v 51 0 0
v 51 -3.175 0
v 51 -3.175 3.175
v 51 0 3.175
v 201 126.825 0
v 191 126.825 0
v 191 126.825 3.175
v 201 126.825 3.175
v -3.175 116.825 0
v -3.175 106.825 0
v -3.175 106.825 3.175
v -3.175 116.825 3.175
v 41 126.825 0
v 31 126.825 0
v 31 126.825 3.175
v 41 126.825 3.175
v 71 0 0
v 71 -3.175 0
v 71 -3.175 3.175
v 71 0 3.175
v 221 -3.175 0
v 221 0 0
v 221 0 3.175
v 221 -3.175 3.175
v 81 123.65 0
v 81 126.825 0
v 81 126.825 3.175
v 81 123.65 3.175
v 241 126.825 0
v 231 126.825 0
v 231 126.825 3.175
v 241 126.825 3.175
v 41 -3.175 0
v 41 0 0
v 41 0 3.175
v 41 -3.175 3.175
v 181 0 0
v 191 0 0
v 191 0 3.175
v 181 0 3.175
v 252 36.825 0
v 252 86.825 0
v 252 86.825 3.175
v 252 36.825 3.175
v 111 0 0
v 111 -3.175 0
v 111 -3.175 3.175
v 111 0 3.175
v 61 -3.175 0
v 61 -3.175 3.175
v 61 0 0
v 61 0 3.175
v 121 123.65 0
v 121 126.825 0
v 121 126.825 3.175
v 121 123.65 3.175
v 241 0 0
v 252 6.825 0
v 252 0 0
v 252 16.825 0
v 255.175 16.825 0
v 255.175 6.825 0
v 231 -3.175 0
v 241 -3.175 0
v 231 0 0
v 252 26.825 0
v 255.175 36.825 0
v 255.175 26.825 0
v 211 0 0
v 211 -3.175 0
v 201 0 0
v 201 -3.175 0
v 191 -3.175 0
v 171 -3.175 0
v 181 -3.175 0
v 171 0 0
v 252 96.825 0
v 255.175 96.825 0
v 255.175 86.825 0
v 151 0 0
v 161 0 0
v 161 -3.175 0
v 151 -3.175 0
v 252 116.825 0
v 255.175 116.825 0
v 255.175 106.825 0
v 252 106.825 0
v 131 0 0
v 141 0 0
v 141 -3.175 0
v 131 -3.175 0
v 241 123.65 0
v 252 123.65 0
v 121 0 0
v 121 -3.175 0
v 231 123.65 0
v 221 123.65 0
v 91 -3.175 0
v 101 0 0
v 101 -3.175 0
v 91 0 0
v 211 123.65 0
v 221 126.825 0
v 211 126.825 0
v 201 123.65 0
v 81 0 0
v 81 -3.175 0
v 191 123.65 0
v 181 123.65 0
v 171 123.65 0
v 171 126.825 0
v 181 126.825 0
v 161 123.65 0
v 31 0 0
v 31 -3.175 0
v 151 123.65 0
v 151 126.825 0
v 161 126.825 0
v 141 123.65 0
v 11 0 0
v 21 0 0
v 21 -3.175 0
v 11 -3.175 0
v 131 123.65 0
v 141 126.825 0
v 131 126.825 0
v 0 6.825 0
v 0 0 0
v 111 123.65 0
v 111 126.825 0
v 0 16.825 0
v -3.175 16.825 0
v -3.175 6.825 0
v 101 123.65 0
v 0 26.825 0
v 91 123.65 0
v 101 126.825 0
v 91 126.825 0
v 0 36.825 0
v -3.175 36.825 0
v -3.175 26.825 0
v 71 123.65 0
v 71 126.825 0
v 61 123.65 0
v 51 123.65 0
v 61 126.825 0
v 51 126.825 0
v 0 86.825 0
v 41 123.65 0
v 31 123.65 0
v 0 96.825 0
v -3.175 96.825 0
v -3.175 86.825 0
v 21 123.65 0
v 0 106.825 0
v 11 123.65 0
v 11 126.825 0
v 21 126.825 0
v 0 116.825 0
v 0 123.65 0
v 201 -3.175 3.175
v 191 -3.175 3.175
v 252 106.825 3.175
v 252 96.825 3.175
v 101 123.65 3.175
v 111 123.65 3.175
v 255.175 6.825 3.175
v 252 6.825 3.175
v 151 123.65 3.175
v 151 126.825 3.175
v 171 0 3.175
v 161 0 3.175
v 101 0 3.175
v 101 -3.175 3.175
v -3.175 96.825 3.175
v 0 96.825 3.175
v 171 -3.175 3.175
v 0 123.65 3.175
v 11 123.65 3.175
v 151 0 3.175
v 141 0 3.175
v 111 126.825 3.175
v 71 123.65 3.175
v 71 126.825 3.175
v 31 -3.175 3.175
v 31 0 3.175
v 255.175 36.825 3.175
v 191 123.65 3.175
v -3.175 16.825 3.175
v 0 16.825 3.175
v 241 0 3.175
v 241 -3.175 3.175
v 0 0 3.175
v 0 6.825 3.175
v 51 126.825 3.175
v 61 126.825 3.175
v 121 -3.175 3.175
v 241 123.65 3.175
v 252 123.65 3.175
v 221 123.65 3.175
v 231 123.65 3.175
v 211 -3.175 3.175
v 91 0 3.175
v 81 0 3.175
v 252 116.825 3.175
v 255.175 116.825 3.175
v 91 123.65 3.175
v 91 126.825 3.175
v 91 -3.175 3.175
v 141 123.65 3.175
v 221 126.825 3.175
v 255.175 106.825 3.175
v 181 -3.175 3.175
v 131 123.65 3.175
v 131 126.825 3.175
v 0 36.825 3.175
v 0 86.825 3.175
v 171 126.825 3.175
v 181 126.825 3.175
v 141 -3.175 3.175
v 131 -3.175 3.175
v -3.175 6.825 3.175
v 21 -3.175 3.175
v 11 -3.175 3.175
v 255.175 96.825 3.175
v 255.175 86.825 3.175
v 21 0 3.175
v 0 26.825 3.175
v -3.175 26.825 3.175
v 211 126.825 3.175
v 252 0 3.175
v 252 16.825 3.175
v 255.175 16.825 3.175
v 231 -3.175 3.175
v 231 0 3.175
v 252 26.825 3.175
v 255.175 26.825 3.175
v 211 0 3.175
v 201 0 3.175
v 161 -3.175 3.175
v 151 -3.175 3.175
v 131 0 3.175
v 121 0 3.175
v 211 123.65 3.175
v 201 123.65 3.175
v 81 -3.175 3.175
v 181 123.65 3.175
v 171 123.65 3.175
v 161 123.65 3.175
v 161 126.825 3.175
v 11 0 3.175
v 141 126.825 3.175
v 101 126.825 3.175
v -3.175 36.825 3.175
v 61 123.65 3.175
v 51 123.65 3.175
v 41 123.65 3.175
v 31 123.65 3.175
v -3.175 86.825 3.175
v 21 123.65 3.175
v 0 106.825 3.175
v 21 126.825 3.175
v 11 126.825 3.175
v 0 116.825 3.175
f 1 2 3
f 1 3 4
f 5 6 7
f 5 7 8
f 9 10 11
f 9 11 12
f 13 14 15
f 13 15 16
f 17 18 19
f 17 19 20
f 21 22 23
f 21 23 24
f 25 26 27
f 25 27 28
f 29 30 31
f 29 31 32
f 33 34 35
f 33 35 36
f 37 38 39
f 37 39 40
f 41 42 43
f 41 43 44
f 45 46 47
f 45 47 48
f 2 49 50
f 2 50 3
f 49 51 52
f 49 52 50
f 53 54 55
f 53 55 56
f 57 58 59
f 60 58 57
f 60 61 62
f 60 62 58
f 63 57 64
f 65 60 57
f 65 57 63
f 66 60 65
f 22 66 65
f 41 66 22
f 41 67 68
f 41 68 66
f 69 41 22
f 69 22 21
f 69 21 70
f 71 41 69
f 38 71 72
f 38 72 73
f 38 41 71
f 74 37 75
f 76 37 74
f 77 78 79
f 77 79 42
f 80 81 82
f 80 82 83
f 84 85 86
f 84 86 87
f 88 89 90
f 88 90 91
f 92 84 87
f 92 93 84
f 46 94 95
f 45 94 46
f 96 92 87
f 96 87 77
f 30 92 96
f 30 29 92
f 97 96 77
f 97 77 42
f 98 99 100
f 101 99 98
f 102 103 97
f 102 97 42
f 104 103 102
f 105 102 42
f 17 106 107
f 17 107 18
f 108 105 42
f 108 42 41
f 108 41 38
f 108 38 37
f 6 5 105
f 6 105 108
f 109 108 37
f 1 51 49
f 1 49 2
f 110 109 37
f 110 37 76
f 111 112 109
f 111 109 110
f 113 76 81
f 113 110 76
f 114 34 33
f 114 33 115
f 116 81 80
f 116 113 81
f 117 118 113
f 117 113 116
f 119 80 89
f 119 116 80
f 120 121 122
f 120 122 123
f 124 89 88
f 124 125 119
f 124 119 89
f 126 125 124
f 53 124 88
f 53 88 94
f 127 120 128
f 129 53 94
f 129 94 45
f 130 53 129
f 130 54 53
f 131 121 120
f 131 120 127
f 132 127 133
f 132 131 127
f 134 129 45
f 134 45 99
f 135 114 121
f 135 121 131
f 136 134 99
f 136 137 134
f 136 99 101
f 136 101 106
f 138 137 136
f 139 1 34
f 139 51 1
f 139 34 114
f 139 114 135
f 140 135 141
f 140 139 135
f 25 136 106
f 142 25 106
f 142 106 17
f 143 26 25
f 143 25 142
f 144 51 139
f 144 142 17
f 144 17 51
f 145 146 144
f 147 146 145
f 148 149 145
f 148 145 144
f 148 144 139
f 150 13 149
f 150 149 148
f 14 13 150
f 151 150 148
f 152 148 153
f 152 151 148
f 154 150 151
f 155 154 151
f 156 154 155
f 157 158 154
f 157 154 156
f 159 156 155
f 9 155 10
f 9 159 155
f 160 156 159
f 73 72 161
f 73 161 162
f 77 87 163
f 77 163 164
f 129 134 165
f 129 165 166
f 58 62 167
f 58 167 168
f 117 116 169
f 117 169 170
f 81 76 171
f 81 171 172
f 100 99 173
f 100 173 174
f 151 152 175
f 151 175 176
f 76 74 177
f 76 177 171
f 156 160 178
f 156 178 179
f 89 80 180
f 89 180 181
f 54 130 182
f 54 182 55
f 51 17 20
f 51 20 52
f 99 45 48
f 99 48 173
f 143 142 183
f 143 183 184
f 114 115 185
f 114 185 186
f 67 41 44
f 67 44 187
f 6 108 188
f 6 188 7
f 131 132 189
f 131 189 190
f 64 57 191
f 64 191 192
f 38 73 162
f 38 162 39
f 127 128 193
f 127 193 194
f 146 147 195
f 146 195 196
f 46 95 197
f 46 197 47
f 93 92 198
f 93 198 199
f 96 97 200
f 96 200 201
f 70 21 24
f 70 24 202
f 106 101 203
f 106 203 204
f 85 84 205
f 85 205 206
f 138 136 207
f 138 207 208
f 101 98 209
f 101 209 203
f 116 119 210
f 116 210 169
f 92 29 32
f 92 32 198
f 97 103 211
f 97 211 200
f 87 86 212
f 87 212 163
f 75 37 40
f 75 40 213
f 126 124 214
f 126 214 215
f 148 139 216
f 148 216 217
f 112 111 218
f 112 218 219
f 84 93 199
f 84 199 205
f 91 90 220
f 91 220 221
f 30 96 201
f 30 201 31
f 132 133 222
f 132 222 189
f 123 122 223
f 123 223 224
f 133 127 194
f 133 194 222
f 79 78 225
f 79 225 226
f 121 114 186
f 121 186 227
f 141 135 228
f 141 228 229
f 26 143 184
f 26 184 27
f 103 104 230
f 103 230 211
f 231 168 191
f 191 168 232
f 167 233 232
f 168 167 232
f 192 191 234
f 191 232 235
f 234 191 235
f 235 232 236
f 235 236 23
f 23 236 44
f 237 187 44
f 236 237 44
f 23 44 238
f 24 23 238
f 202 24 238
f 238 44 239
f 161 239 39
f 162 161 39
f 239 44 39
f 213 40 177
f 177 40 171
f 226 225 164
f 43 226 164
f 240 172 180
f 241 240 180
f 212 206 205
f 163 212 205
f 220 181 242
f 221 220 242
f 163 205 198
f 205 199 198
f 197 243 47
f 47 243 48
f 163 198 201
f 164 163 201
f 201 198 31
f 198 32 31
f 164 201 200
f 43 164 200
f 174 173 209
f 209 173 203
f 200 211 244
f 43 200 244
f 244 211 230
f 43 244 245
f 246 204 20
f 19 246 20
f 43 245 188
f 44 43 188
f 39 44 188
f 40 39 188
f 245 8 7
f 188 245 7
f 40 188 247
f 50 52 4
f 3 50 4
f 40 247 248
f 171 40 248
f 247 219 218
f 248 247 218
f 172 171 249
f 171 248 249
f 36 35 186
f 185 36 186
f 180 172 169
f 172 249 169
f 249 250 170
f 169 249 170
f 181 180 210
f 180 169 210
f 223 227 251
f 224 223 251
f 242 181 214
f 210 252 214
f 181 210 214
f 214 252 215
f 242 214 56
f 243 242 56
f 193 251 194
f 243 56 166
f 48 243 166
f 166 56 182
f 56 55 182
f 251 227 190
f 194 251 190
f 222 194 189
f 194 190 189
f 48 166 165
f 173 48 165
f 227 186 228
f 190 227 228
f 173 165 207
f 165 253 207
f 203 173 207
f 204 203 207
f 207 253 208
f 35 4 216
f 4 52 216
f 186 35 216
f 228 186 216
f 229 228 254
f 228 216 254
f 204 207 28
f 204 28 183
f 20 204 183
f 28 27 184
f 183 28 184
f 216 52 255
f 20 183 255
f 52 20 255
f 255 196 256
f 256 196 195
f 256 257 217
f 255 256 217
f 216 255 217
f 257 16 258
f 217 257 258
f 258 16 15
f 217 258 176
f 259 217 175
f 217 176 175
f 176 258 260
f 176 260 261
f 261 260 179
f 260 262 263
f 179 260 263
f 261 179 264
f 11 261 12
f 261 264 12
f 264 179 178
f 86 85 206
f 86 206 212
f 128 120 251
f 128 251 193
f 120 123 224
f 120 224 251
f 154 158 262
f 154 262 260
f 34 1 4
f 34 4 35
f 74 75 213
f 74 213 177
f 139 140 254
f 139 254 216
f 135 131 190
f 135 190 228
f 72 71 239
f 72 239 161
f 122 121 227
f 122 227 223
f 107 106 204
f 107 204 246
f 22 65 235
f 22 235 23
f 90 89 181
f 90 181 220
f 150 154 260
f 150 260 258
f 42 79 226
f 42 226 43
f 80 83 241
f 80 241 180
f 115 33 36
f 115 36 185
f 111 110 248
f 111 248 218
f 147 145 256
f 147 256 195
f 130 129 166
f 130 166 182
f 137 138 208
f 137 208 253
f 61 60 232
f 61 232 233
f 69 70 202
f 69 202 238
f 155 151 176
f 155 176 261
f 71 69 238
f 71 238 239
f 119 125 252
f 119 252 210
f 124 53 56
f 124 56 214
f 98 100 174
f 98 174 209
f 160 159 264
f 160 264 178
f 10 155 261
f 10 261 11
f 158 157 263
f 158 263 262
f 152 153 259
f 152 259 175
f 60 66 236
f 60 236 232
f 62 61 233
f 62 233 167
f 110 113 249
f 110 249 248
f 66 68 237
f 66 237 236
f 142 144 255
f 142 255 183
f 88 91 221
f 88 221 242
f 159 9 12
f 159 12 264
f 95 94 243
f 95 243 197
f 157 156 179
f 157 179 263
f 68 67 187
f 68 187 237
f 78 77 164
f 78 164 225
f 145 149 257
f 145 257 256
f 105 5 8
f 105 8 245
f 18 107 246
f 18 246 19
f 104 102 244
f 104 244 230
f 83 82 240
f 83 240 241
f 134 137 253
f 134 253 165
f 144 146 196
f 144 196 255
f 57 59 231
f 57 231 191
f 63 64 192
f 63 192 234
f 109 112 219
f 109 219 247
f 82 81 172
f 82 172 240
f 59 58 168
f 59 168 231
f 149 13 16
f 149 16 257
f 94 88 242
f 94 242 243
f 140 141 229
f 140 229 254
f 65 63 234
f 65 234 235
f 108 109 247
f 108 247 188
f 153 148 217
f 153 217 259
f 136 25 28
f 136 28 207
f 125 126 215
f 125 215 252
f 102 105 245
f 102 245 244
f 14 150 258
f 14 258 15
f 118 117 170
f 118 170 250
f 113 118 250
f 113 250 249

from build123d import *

# Parameters (mm, degrees)
BOSS_EXTRUDE1_DEPTH = 3.175


with BuildPart() as part:
    # Sketch1 → Boss-Extrude1 (new body)
    with BuildSketch(Plane.XY):
        Polygon((31, 123.65), (31, 126.825), (41, 126.825), (41, 123.65), (51, 123.65), (51, 126.825), (61, 126.825), (61, 123.65), (71, 123.65), (71, 126.825), (81, 126.825), (81, 123.65), (91, 123.65), (91, 126.825), (101, 126.825), (101, 123.65), (111, 123.65), (111, 126.825), (121, 126.825), (121, 123.65), (131, 123.65), (131, 126.825), (141, 126.825), (141, 123.65), (151, 123.65), (151, 126.825), (161, 126.825), (161, 123.65), (171, 123.65), (171, 126.825), (181, 126.825), (181, 123.65), (191, 123.65), (191, 126.825), (201, 126.825), (201, 123.65), (211, 123.65), (211, 126.825), (221, 126.825), (221, 123.65), (231, 123.65), (231, 126.825), (241, 126.825), (241, 123.65), (252, 123.65), (252, 116.825), (255.175, 116.825), (255.175, 106.825), (252, 106.825), (252, 96.825), (255.175, 96.825), (255.175, 86.825), (252, 86.825), (252, 36.825), (255.175, 36.825), (255.175, 26.825), (252, 26.825), (252, 16.825), (255.175, 16.825), (255.175, 6.825), (252, 6.825), (252, 0), (241, 0), (241, -3.175), (231, -3.175), (231, 0), (221, 0), (221, -3.175), (211, -3.175), (211, 0), (201, 0), (201, -3.175), (191, -3.175), (191, 0), (181, 0), (181, -3.175), (171, -3.175), (171, 0), (161, 0), (161, -3.175), (151, -3.175), (151, 0), (141, 0), (141, -3.175), (131, -3.175), (131, 0), (121, 0), (121, -3.175), (111, -3.175), (111, 0), (101, 0), (101, -3.175), (91, -3.175), (91, 0), (81, 0), (81, -3.175), (71, -3.175), (71, 0), (61, 0), (61, -3.175), (51, -3.175), (51, 0), (41, 0), (41, -3.175), (31, -3.175), (31, 0), (21, 0), (21, -3.175), (11, -3.175), (11, 0), (0, 0), (0, 6.825), (-3.175, 6.825), (-3.175, 16.825), (0, 16.825), (0, 26.825), (-3.175, 26.825), (-3.175, 36.825), (0, 36.825), (0, 86.825), (-3.175, 86.825), (-3.175, 96.825), (0, 96.825), (0, 106.825), (-3.175, 106.825), (-3.175, 116.825), (0, 116.825), (0, 123.65), (11, 123.65), (11, 126.825), (21, 126.825), (21, 123.65), align=None)
    extrude(amount=BOSS_EXTRUDE1_DEPTH)


solid = part.part
